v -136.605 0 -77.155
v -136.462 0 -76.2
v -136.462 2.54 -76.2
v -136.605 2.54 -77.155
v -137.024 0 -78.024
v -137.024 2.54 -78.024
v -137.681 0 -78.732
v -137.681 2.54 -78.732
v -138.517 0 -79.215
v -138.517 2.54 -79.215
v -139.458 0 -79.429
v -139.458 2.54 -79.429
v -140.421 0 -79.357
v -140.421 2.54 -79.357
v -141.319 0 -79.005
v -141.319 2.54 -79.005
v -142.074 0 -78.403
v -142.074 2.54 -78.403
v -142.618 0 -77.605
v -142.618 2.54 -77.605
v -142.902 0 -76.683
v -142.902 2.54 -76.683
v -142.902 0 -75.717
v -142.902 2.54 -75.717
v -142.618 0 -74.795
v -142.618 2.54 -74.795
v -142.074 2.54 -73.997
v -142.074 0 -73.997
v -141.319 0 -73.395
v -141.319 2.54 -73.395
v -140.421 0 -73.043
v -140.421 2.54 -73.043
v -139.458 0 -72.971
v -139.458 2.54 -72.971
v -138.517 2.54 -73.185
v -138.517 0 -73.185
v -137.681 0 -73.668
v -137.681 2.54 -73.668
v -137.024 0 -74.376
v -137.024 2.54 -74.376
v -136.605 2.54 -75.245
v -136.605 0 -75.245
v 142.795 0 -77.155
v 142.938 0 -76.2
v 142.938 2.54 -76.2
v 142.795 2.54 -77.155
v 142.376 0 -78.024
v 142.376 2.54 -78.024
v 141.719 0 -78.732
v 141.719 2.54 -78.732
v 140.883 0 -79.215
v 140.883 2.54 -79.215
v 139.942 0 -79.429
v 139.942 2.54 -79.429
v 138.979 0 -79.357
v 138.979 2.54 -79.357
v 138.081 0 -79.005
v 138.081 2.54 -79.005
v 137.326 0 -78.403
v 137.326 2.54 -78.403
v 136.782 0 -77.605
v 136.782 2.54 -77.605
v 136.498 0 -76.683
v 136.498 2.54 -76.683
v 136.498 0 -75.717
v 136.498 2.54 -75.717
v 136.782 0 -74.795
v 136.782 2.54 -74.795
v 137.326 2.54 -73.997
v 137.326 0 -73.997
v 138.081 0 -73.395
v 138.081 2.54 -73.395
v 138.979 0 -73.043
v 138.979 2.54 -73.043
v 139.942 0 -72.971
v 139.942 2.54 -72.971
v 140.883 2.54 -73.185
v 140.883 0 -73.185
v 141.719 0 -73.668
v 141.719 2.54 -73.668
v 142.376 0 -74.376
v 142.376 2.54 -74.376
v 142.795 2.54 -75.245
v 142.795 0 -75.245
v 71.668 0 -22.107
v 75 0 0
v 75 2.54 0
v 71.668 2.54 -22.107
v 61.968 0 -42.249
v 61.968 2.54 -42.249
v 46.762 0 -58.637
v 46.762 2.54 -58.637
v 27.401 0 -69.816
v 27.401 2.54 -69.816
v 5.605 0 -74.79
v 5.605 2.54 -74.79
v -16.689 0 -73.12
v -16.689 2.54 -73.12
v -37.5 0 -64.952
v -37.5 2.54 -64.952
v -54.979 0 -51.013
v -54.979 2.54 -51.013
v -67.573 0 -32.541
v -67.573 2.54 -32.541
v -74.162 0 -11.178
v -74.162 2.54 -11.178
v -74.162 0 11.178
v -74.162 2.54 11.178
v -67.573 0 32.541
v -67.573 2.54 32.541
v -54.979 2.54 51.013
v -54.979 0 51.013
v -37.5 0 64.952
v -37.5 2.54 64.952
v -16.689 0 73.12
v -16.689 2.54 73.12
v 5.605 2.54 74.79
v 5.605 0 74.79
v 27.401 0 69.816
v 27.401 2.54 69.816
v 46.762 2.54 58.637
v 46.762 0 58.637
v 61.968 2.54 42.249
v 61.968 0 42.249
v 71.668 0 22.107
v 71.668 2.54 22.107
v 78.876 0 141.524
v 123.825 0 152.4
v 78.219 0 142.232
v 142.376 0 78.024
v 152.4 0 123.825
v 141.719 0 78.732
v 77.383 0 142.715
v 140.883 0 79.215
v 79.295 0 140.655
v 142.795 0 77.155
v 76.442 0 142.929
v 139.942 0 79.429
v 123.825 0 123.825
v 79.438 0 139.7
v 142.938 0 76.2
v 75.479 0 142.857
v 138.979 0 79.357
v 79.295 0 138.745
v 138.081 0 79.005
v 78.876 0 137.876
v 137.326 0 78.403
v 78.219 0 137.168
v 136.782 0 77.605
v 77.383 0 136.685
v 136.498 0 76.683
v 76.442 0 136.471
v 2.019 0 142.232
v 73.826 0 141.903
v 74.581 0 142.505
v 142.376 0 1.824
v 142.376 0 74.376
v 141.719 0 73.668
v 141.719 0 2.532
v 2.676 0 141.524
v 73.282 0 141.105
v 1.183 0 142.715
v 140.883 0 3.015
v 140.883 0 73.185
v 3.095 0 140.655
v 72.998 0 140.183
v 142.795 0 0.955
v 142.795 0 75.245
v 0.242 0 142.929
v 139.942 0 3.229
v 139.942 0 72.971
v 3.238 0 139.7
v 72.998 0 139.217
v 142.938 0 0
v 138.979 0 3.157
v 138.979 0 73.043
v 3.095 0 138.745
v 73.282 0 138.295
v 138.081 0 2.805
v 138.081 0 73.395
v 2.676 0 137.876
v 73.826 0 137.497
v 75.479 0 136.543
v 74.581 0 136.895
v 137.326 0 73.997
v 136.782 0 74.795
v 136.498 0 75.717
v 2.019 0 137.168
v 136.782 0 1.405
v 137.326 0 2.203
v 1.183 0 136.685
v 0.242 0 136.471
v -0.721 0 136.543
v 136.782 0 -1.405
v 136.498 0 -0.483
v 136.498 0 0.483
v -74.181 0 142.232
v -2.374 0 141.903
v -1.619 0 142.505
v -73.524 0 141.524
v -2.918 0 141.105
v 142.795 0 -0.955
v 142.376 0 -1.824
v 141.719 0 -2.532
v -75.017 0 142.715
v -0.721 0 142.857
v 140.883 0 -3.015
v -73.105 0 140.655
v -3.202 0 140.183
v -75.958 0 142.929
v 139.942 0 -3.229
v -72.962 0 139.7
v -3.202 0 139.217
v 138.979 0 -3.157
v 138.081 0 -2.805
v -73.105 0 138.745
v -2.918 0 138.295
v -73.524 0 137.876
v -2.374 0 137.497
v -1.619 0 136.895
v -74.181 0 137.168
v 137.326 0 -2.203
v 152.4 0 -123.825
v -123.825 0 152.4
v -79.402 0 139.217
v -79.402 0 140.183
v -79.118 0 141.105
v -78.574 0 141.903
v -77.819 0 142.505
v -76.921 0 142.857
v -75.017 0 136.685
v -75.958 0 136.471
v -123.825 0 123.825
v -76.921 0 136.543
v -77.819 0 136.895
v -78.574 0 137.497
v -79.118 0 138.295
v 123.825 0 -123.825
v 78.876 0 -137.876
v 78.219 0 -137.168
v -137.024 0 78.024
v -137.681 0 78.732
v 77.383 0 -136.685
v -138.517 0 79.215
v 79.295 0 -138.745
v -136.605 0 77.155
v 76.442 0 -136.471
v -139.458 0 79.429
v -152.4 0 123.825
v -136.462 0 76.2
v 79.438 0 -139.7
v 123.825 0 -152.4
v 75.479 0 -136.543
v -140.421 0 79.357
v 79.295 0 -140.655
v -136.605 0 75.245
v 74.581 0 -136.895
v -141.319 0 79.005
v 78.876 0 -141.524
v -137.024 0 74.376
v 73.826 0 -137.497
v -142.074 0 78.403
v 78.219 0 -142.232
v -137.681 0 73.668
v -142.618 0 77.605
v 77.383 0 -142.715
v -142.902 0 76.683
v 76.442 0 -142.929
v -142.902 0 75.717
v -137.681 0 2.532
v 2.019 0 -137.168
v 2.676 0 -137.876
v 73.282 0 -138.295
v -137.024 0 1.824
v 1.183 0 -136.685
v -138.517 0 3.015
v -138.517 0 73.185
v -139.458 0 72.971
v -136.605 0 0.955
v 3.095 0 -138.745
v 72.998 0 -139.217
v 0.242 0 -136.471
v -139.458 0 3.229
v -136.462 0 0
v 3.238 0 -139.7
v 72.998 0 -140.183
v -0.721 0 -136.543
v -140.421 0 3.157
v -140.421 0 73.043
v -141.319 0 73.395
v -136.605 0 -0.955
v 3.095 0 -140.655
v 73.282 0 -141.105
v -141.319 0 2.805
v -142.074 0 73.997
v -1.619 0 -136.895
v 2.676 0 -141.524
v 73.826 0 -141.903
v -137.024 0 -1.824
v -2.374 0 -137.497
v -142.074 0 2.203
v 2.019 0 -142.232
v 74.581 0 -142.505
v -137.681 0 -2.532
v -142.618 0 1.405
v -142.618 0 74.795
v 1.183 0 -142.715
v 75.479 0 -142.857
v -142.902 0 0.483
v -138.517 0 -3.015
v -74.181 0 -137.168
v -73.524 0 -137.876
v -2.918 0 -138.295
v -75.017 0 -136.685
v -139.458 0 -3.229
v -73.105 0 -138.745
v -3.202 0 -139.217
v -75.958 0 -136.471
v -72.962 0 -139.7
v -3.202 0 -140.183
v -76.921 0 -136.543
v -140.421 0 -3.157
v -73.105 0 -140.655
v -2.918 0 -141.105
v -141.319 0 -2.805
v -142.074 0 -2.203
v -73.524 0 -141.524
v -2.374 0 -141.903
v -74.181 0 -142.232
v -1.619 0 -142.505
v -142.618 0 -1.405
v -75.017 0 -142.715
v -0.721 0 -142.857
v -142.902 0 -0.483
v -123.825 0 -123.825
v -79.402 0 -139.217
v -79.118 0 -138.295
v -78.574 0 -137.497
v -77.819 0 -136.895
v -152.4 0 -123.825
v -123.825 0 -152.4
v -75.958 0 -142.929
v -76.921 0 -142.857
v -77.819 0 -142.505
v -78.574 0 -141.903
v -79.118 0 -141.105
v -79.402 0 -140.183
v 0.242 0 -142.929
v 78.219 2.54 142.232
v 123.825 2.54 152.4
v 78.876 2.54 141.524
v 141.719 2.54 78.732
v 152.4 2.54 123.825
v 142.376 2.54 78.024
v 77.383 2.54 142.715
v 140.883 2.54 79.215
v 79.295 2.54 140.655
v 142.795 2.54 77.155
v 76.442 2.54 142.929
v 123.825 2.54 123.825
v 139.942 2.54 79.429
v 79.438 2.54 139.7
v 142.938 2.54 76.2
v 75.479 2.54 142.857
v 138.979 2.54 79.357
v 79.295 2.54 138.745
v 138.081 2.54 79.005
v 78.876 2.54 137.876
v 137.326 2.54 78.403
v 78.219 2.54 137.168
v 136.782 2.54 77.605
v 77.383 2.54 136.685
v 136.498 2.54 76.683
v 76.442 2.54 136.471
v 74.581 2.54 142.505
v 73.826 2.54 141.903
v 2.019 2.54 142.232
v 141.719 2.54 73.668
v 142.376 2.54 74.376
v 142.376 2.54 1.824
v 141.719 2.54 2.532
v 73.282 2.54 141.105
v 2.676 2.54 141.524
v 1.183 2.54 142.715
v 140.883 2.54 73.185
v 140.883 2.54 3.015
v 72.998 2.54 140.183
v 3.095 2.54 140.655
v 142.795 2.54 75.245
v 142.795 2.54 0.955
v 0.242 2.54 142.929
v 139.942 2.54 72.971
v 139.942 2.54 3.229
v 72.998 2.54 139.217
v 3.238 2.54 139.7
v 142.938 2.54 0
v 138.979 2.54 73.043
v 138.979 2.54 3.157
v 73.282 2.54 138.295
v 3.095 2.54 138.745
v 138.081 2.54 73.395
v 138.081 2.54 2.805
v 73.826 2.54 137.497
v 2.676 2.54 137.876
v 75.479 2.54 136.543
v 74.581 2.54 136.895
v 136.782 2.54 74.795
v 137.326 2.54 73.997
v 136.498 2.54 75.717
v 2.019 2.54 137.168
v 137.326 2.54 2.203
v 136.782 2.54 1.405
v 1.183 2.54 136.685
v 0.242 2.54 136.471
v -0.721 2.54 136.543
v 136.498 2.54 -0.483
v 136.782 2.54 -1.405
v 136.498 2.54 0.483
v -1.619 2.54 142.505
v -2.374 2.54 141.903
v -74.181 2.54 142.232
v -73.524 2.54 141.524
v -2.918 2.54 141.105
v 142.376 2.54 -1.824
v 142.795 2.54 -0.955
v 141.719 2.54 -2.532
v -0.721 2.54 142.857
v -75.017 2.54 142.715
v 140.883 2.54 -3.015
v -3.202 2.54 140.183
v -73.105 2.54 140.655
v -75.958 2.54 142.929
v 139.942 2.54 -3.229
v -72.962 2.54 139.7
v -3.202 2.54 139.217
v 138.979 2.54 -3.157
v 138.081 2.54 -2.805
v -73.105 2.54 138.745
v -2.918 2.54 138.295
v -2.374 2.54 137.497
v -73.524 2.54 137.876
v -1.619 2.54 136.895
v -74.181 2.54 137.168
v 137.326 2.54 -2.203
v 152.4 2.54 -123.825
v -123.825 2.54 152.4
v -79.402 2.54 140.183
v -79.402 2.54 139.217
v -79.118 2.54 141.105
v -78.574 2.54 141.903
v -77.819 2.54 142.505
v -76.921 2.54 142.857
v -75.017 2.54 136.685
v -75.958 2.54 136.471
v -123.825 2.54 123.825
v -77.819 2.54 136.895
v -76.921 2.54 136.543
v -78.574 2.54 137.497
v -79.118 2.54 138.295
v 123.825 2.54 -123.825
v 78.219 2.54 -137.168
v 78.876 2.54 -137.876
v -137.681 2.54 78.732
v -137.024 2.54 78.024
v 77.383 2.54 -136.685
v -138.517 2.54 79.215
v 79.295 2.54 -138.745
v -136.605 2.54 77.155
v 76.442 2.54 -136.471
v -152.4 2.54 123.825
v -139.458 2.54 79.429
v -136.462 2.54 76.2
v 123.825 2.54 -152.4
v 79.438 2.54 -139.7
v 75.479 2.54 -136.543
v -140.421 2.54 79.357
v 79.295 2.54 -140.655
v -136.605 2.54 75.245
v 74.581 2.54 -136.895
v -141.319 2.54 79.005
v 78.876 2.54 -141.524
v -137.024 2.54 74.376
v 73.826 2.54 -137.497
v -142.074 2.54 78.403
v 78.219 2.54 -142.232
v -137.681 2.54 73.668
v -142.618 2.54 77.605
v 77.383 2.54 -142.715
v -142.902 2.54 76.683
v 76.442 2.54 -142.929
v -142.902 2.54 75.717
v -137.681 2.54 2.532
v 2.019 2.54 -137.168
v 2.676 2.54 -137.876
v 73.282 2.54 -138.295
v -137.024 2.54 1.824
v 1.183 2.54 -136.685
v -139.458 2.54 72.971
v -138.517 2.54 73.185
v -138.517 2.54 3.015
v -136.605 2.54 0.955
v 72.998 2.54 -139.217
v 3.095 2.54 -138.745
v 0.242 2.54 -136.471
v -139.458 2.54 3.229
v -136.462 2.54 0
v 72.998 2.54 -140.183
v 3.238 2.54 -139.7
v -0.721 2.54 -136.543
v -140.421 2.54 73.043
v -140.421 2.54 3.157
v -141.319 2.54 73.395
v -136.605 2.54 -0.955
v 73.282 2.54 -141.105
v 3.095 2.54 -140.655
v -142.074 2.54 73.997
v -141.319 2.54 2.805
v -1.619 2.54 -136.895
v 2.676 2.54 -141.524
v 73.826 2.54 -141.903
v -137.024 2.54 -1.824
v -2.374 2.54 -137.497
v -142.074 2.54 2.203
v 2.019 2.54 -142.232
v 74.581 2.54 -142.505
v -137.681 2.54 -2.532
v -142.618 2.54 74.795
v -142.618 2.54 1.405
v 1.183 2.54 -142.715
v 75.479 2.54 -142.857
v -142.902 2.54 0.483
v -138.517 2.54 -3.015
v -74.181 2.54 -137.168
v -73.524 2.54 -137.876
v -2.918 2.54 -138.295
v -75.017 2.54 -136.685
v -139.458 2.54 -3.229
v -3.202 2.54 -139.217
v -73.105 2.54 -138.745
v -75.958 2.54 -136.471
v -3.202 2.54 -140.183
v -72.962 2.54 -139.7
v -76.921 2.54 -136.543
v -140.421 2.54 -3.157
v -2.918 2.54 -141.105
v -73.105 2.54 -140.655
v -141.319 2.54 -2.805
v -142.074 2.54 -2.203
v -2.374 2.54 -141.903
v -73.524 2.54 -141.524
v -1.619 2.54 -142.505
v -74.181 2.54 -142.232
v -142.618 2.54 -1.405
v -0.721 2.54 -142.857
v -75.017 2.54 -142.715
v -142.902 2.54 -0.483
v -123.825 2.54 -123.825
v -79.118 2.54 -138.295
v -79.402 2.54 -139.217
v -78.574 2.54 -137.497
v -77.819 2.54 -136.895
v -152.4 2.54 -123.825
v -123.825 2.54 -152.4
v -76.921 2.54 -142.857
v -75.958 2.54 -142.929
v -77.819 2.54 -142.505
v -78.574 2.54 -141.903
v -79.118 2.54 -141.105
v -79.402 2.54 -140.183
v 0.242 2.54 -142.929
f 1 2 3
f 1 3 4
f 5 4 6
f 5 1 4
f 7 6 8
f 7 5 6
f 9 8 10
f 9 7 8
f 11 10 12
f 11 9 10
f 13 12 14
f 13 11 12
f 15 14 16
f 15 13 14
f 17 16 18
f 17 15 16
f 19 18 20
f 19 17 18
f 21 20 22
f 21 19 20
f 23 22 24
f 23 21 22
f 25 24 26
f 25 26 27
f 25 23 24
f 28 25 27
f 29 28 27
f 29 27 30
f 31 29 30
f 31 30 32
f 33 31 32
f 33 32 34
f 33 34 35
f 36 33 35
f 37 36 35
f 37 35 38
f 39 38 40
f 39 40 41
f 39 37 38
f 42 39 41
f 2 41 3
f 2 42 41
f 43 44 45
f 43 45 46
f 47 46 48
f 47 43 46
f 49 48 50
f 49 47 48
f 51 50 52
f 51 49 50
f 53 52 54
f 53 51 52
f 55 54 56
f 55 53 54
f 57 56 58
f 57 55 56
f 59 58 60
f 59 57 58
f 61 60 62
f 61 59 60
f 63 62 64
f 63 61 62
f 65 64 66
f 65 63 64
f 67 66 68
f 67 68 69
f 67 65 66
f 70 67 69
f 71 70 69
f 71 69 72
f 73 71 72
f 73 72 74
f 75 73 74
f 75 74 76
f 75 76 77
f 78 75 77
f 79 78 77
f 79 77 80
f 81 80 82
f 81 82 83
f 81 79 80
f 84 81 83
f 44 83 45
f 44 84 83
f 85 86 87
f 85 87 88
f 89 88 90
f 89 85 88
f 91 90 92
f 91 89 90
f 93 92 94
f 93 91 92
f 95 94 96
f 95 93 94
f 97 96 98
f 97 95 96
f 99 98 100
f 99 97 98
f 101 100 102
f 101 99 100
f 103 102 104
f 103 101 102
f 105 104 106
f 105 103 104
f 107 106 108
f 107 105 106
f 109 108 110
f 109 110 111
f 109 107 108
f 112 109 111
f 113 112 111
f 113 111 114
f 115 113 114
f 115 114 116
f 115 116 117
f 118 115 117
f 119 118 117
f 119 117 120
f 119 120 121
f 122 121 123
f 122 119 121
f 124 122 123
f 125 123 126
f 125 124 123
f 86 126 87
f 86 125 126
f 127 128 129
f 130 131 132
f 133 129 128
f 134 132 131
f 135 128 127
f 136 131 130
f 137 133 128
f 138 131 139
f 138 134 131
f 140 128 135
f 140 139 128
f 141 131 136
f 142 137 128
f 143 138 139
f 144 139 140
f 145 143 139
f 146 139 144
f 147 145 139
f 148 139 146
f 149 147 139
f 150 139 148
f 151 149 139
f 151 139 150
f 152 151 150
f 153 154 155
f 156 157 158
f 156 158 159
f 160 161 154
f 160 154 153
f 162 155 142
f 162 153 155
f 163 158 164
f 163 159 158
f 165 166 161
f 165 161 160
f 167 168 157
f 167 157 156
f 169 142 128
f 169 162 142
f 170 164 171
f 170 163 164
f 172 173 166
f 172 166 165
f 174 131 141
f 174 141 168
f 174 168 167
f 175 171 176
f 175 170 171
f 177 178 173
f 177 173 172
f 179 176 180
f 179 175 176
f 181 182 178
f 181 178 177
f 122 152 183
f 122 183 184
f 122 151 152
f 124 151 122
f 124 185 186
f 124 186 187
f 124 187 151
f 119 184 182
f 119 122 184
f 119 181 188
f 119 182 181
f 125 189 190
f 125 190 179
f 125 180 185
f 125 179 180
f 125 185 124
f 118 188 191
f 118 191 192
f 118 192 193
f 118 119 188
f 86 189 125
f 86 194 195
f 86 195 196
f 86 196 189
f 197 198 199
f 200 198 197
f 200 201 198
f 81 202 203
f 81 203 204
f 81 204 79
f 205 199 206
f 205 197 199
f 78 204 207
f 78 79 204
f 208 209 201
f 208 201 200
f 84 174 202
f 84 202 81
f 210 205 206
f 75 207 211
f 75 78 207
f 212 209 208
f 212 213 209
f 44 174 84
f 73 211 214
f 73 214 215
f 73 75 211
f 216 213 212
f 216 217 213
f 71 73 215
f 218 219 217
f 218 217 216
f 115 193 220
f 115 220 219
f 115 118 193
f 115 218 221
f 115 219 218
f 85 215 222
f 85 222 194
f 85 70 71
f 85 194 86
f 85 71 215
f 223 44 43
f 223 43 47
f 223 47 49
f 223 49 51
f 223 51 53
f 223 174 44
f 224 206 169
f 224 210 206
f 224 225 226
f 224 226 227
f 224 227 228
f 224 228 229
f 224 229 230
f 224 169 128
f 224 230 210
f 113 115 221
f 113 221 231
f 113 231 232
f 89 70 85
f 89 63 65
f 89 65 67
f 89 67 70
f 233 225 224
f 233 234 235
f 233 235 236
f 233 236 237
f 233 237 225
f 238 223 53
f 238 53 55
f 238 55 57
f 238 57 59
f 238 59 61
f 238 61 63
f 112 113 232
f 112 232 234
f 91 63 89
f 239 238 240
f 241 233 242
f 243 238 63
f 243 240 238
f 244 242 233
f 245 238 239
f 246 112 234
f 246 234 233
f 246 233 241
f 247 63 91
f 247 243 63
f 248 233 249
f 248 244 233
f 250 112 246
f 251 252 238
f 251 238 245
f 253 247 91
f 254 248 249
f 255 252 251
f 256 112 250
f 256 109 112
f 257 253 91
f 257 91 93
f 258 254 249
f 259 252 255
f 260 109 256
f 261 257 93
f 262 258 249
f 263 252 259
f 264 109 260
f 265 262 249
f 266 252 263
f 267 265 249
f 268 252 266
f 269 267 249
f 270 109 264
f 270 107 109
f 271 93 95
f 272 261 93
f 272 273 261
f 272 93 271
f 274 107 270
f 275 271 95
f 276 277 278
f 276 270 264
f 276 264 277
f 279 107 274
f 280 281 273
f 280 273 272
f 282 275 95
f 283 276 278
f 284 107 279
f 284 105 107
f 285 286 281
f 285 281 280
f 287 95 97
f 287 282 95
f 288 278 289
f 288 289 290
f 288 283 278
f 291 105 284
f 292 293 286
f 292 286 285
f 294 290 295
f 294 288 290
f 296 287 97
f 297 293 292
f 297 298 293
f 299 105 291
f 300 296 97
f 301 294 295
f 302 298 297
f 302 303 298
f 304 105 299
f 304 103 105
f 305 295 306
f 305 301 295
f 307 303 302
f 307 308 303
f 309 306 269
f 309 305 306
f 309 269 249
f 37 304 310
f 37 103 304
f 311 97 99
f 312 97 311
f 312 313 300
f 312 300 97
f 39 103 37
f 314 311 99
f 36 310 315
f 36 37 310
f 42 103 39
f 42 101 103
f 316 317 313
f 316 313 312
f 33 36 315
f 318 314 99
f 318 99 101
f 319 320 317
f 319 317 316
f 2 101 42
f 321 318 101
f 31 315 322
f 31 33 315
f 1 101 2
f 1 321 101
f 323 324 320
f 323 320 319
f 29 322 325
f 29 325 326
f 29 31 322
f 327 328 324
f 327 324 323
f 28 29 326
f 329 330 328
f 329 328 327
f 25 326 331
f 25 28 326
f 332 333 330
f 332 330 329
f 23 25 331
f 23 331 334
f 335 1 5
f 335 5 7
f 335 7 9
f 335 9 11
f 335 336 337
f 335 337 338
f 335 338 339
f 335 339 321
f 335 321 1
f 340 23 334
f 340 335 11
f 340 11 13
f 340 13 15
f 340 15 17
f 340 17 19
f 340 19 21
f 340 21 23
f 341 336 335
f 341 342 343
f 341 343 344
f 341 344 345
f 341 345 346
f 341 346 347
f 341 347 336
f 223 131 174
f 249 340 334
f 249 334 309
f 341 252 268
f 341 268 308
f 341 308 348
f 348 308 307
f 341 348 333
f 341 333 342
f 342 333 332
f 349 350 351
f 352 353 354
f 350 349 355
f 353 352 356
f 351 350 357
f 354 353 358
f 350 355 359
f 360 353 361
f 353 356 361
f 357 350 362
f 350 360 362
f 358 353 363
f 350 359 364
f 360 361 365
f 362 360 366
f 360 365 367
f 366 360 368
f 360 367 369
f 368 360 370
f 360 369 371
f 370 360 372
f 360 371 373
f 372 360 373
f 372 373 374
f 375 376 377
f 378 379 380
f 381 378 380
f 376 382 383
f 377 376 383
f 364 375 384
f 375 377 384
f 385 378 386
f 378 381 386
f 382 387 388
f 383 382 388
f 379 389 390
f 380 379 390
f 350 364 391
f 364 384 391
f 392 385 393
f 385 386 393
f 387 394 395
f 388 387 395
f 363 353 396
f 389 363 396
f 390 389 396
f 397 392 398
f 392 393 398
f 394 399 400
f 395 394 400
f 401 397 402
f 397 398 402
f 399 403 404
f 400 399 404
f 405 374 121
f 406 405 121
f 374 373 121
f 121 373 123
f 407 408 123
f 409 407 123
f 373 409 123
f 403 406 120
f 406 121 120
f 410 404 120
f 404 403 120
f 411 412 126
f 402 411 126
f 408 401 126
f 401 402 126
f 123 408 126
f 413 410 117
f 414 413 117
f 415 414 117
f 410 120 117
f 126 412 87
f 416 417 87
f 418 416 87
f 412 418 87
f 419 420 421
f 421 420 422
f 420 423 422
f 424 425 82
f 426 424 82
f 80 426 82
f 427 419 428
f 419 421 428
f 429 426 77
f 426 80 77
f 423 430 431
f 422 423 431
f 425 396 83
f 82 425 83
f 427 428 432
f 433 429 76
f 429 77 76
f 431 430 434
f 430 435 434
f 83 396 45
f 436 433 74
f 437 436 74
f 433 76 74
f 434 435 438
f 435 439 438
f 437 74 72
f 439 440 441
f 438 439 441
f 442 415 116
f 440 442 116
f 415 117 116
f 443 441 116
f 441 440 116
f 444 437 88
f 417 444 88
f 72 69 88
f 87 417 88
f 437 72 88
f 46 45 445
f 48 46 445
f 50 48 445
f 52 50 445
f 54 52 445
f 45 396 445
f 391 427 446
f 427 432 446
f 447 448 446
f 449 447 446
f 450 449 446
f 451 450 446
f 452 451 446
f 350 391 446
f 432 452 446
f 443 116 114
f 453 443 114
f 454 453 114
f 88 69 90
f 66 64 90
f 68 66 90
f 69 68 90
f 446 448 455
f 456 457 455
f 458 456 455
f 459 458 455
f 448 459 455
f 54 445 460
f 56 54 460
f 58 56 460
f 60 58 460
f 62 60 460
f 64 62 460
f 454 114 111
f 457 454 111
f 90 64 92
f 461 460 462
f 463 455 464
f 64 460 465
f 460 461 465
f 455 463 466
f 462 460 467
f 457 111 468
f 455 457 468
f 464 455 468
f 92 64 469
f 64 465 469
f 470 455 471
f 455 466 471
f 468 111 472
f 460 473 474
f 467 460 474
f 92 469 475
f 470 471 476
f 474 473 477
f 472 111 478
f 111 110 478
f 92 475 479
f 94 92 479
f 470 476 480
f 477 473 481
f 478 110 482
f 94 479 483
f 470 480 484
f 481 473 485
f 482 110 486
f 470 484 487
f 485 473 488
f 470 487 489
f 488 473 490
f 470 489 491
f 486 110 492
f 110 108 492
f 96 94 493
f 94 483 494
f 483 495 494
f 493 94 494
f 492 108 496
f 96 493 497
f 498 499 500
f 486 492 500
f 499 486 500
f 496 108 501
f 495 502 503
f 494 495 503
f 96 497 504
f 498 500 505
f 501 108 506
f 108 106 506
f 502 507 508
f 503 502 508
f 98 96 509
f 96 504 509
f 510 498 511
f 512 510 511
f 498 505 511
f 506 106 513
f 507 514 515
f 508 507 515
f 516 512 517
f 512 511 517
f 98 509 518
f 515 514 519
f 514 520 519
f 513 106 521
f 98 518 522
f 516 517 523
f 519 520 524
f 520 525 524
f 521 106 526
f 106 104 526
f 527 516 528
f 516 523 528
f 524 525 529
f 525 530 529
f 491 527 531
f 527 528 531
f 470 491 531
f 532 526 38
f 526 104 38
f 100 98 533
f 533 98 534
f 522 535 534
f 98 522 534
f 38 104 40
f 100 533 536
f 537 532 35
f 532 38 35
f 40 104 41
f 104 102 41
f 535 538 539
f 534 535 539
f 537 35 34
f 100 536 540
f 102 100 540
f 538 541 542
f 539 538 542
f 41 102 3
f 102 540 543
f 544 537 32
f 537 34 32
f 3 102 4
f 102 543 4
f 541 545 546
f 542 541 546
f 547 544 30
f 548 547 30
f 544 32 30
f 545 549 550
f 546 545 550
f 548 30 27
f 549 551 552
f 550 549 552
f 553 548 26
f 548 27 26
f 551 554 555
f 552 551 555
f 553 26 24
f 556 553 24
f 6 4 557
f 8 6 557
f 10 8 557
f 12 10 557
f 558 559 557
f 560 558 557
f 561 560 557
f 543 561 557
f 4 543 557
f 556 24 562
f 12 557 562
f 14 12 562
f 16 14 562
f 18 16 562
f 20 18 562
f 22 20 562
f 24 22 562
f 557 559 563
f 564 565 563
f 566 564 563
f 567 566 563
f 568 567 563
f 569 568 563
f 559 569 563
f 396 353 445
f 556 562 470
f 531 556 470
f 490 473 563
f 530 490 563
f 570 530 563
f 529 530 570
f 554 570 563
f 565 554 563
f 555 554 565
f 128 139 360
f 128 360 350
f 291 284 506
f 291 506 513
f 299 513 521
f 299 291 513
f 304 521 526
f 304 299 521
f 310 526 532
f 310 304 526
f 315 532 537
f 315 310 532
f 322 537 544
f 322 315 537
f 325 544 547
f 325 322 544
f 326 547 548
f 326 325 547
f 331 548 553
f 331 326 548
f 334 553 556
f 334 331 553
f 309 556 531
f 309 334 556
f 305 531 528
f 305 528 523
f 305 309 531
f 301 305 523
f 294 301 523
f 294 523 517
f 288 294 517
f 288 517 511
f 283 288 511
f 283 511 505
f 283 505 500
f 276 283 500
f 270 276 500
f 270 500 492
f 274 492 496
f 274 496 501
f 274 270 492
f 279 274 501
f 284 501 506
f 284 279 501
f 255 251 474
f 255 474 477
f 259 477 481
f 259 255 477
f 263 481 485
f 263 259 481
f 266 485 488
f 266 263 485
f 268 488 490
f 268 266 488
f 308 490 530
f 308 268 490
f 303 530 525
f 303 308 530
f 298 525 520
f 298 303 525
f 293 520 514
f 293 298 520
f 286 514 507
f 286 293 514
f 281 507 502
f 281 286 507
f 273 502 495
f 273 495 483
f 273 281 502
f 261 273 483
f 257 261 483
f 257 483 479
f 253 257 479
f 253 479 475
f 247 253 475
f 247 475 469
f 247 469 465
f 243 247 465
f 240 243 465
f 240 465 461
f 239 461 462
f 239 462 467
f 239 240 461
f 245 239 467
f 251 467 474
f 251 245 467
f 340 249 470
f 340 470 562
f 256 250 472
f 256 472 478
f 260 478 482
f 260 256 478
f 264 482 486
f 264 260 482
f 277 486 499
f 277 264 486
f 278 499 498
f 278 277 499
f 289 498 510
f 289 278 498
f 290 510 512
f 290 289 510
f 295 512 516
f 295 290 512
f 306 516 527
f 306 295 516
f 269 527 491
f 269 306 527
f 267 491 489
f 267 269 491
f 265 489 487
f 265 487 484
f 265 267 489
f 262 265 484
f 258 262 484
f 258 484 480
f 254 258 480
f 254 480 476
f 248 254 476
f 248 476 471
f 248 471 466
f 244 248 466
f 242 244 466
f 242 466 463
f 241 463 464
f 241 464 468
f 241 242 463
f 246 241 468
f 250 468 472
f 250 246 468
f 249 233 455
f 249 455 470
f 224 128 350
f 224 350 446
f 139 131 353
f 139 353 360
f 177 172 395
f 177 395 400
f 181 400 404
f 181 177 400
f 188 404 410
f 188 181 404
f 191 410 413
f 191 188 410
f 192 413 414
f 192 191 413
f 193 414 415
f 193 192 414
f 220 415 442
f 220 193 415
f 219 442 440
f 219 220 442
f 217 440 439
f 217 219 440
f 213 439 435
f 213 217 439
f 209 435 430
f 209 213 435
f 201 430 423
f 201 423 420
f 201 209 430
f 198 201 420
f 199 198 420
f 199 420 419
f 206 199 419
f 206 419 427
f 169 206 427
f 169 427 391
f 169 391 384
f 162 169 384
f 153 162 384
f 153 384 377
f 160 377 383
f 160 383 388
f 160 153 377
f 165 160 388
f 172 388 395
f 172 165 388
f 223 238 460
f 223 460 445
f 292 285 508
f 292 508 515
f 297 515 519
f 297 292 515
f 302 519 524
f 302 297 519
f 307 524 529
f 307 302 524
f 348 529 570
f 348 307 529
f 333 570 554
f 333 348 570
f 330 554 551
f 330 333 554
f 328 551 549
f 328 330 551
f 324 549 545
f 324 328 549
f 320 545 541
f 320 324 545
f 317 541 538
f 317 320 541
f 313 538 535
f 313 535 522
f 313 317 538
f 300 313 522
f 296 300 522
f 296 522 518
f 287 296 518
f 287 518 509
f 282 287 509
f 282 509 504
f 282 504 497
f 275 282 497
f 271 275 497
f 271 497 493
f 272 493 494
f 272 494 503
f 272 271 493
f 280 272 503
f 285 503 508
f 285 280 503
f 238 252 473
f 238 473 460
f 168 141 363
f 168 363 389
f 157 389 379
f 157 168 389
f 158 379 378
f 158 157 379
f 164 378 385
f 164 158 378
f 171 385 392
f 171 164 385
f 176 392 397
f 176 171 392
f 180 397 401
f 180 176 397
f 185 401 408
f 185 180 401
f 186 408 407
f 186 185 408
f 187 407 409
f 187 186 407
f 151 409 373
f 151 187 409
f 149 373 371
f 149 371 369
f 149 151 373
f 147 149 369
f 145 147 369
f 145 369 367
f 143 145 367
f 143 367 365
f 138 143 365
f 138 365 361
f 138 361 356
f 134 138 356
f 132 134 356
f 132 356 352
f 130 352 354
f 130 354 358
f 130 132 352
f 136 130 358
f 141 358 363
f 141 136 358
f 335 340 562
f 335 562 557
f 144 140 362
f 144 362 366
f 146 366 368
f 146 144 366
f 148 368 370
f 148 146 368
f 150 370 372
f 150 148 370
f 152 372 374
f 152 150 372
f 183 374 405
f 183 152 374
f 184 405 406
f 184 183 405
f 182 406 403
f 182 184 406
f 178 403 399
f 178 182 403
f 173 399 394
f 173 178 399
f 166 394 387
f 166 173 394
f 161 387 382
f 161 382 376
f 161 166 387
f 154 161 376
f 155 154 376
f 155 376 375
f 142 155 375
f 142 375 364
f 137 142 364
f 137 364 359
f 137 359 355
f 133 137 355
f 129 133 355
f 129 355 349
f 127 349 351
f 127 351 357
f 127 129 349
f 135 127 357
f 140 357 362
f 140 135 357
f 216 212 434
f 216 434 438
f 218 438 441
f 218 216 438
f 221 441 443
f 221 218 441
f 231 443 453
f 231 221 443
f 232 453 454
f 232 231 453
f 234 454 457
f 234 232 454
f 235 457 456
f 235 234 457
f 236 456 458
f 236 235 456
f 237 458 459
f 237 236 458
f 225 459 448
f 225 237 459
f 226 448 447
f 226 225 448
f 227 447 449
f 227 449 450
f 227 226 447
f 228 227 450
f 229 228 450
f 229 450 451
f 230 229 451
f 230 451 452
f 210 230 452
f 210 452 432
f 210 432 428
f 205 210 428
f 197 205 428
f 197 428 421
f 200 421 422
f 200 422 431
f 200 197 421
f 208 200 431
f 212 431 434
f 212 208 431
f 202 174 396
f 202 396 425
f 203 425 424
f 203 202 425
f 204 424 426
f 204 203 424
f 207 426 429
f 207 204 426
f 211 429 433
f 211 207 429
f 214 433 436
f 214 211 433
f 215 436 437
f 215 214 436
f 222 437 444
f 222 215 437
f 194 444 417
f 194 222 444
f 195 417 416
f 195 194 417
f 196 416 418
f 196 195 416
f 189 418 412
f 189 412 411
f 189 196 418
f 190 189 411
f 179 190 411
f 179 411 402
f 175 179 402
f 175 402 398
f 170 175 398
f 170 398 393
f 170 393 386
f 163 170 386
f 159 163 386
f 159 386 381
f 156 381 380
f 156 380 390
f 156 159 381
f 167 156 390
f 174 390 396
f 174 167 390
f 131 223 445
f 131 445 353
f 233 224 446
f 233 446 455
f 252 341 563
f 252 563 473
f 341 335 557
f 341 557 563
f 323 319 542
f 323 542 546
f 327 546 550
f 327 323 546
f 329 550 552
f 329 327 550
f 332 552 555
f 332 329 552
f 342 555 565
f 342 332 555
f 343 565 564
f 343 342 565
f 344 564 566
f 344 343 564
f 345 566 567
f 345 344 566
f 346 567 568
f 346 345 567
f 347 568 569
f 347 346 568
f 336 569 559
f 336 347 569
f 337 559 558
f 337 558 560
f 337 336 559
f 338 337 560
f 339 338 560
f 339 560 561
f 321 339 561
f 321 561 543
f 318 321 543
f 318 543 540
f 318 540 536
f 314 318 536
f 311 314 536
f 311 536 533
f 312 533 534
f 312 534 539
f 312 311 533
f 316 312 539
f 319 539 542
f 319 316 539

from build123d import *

# Parameters (mm, degrees)
SKETCH1_R           = 3.2385
SKETCH1_R_2         = 75
BOSS_EXTRUDE1_DEPTH = 2.54


with BuildPart() as part:
    # Sketch1 → Boss-Extrude1 (new body)
    with BuildSketch(Plane(origin=(0, 0, 0), x_dir=(1, 0, 0), z_dir=(0, 1, 0))):
        Polygon((123.825, 152.4), (123.825, 123.825), (152.4, 123.825), (152.4, -123.825), (123.825, -123.825), (123.825, -152.4), (-123.825, -152.4), (-123.825, -123.825), (-152.4, -123.825), (-152.4, 123.825), (-123.825, 123.825), (-123.825, 152.4), align=None)
        with Locations((76.2, 139.7)):
            Circle(SKETCH1_R, mode=Mode.SUBTRACT)
        with Locations((0, 139.7)):
            Circle(SKETCH1_R, mode=Mode.SUBTRACT)
        with Locations((-76.2, 139.7)):
            Circle(SKETCH1_R, mode=Mode.SUBTRACT)
        with Locations((-76.2, -139.7)):
            Circle(SKETCH1_R, mode=Mode.SUBTRACT)
        with Locations((0, -139.7)):
            Circle(SKETCH1_R, mode=Mode.SUBTRACT)
        with Locations((76.2, -139.7)):
            Circle(SKETCH1_R, mode=Mode.SUBTRACT)
        with Locations((139.7, -76.2)):
            Circle(SKETCH1_R, mode=Mode.SUBTRACT)
        with Locations((139.7, 0)):
            Circle(SKETCH1_R, mode=Mode.SUBTRACT)
        with Locations((139.7, 76.2)):
            Circle(SKETCH1_R, mode=Mode.SUBTRACT)
        with Locations((-139.7, 76.2)):
            Circle(SKETCH1_R, mode=Mode.SUBTRACT)
        with Locations((-139.7, 0)):
            Circle(SKETCH1_R, mode=Mode.SUBTRACT)
        with Locations((-139.7, -76.2)):
            Circle(SKETCH1_R, mode=Mode.SUBTRACT)
        Circle(SKETCH1_R_2, mode=Mode.SUBTRACT)
    extrude(amount=BOSS_EXTRUDE1_DEPTH)


solid = part.part
